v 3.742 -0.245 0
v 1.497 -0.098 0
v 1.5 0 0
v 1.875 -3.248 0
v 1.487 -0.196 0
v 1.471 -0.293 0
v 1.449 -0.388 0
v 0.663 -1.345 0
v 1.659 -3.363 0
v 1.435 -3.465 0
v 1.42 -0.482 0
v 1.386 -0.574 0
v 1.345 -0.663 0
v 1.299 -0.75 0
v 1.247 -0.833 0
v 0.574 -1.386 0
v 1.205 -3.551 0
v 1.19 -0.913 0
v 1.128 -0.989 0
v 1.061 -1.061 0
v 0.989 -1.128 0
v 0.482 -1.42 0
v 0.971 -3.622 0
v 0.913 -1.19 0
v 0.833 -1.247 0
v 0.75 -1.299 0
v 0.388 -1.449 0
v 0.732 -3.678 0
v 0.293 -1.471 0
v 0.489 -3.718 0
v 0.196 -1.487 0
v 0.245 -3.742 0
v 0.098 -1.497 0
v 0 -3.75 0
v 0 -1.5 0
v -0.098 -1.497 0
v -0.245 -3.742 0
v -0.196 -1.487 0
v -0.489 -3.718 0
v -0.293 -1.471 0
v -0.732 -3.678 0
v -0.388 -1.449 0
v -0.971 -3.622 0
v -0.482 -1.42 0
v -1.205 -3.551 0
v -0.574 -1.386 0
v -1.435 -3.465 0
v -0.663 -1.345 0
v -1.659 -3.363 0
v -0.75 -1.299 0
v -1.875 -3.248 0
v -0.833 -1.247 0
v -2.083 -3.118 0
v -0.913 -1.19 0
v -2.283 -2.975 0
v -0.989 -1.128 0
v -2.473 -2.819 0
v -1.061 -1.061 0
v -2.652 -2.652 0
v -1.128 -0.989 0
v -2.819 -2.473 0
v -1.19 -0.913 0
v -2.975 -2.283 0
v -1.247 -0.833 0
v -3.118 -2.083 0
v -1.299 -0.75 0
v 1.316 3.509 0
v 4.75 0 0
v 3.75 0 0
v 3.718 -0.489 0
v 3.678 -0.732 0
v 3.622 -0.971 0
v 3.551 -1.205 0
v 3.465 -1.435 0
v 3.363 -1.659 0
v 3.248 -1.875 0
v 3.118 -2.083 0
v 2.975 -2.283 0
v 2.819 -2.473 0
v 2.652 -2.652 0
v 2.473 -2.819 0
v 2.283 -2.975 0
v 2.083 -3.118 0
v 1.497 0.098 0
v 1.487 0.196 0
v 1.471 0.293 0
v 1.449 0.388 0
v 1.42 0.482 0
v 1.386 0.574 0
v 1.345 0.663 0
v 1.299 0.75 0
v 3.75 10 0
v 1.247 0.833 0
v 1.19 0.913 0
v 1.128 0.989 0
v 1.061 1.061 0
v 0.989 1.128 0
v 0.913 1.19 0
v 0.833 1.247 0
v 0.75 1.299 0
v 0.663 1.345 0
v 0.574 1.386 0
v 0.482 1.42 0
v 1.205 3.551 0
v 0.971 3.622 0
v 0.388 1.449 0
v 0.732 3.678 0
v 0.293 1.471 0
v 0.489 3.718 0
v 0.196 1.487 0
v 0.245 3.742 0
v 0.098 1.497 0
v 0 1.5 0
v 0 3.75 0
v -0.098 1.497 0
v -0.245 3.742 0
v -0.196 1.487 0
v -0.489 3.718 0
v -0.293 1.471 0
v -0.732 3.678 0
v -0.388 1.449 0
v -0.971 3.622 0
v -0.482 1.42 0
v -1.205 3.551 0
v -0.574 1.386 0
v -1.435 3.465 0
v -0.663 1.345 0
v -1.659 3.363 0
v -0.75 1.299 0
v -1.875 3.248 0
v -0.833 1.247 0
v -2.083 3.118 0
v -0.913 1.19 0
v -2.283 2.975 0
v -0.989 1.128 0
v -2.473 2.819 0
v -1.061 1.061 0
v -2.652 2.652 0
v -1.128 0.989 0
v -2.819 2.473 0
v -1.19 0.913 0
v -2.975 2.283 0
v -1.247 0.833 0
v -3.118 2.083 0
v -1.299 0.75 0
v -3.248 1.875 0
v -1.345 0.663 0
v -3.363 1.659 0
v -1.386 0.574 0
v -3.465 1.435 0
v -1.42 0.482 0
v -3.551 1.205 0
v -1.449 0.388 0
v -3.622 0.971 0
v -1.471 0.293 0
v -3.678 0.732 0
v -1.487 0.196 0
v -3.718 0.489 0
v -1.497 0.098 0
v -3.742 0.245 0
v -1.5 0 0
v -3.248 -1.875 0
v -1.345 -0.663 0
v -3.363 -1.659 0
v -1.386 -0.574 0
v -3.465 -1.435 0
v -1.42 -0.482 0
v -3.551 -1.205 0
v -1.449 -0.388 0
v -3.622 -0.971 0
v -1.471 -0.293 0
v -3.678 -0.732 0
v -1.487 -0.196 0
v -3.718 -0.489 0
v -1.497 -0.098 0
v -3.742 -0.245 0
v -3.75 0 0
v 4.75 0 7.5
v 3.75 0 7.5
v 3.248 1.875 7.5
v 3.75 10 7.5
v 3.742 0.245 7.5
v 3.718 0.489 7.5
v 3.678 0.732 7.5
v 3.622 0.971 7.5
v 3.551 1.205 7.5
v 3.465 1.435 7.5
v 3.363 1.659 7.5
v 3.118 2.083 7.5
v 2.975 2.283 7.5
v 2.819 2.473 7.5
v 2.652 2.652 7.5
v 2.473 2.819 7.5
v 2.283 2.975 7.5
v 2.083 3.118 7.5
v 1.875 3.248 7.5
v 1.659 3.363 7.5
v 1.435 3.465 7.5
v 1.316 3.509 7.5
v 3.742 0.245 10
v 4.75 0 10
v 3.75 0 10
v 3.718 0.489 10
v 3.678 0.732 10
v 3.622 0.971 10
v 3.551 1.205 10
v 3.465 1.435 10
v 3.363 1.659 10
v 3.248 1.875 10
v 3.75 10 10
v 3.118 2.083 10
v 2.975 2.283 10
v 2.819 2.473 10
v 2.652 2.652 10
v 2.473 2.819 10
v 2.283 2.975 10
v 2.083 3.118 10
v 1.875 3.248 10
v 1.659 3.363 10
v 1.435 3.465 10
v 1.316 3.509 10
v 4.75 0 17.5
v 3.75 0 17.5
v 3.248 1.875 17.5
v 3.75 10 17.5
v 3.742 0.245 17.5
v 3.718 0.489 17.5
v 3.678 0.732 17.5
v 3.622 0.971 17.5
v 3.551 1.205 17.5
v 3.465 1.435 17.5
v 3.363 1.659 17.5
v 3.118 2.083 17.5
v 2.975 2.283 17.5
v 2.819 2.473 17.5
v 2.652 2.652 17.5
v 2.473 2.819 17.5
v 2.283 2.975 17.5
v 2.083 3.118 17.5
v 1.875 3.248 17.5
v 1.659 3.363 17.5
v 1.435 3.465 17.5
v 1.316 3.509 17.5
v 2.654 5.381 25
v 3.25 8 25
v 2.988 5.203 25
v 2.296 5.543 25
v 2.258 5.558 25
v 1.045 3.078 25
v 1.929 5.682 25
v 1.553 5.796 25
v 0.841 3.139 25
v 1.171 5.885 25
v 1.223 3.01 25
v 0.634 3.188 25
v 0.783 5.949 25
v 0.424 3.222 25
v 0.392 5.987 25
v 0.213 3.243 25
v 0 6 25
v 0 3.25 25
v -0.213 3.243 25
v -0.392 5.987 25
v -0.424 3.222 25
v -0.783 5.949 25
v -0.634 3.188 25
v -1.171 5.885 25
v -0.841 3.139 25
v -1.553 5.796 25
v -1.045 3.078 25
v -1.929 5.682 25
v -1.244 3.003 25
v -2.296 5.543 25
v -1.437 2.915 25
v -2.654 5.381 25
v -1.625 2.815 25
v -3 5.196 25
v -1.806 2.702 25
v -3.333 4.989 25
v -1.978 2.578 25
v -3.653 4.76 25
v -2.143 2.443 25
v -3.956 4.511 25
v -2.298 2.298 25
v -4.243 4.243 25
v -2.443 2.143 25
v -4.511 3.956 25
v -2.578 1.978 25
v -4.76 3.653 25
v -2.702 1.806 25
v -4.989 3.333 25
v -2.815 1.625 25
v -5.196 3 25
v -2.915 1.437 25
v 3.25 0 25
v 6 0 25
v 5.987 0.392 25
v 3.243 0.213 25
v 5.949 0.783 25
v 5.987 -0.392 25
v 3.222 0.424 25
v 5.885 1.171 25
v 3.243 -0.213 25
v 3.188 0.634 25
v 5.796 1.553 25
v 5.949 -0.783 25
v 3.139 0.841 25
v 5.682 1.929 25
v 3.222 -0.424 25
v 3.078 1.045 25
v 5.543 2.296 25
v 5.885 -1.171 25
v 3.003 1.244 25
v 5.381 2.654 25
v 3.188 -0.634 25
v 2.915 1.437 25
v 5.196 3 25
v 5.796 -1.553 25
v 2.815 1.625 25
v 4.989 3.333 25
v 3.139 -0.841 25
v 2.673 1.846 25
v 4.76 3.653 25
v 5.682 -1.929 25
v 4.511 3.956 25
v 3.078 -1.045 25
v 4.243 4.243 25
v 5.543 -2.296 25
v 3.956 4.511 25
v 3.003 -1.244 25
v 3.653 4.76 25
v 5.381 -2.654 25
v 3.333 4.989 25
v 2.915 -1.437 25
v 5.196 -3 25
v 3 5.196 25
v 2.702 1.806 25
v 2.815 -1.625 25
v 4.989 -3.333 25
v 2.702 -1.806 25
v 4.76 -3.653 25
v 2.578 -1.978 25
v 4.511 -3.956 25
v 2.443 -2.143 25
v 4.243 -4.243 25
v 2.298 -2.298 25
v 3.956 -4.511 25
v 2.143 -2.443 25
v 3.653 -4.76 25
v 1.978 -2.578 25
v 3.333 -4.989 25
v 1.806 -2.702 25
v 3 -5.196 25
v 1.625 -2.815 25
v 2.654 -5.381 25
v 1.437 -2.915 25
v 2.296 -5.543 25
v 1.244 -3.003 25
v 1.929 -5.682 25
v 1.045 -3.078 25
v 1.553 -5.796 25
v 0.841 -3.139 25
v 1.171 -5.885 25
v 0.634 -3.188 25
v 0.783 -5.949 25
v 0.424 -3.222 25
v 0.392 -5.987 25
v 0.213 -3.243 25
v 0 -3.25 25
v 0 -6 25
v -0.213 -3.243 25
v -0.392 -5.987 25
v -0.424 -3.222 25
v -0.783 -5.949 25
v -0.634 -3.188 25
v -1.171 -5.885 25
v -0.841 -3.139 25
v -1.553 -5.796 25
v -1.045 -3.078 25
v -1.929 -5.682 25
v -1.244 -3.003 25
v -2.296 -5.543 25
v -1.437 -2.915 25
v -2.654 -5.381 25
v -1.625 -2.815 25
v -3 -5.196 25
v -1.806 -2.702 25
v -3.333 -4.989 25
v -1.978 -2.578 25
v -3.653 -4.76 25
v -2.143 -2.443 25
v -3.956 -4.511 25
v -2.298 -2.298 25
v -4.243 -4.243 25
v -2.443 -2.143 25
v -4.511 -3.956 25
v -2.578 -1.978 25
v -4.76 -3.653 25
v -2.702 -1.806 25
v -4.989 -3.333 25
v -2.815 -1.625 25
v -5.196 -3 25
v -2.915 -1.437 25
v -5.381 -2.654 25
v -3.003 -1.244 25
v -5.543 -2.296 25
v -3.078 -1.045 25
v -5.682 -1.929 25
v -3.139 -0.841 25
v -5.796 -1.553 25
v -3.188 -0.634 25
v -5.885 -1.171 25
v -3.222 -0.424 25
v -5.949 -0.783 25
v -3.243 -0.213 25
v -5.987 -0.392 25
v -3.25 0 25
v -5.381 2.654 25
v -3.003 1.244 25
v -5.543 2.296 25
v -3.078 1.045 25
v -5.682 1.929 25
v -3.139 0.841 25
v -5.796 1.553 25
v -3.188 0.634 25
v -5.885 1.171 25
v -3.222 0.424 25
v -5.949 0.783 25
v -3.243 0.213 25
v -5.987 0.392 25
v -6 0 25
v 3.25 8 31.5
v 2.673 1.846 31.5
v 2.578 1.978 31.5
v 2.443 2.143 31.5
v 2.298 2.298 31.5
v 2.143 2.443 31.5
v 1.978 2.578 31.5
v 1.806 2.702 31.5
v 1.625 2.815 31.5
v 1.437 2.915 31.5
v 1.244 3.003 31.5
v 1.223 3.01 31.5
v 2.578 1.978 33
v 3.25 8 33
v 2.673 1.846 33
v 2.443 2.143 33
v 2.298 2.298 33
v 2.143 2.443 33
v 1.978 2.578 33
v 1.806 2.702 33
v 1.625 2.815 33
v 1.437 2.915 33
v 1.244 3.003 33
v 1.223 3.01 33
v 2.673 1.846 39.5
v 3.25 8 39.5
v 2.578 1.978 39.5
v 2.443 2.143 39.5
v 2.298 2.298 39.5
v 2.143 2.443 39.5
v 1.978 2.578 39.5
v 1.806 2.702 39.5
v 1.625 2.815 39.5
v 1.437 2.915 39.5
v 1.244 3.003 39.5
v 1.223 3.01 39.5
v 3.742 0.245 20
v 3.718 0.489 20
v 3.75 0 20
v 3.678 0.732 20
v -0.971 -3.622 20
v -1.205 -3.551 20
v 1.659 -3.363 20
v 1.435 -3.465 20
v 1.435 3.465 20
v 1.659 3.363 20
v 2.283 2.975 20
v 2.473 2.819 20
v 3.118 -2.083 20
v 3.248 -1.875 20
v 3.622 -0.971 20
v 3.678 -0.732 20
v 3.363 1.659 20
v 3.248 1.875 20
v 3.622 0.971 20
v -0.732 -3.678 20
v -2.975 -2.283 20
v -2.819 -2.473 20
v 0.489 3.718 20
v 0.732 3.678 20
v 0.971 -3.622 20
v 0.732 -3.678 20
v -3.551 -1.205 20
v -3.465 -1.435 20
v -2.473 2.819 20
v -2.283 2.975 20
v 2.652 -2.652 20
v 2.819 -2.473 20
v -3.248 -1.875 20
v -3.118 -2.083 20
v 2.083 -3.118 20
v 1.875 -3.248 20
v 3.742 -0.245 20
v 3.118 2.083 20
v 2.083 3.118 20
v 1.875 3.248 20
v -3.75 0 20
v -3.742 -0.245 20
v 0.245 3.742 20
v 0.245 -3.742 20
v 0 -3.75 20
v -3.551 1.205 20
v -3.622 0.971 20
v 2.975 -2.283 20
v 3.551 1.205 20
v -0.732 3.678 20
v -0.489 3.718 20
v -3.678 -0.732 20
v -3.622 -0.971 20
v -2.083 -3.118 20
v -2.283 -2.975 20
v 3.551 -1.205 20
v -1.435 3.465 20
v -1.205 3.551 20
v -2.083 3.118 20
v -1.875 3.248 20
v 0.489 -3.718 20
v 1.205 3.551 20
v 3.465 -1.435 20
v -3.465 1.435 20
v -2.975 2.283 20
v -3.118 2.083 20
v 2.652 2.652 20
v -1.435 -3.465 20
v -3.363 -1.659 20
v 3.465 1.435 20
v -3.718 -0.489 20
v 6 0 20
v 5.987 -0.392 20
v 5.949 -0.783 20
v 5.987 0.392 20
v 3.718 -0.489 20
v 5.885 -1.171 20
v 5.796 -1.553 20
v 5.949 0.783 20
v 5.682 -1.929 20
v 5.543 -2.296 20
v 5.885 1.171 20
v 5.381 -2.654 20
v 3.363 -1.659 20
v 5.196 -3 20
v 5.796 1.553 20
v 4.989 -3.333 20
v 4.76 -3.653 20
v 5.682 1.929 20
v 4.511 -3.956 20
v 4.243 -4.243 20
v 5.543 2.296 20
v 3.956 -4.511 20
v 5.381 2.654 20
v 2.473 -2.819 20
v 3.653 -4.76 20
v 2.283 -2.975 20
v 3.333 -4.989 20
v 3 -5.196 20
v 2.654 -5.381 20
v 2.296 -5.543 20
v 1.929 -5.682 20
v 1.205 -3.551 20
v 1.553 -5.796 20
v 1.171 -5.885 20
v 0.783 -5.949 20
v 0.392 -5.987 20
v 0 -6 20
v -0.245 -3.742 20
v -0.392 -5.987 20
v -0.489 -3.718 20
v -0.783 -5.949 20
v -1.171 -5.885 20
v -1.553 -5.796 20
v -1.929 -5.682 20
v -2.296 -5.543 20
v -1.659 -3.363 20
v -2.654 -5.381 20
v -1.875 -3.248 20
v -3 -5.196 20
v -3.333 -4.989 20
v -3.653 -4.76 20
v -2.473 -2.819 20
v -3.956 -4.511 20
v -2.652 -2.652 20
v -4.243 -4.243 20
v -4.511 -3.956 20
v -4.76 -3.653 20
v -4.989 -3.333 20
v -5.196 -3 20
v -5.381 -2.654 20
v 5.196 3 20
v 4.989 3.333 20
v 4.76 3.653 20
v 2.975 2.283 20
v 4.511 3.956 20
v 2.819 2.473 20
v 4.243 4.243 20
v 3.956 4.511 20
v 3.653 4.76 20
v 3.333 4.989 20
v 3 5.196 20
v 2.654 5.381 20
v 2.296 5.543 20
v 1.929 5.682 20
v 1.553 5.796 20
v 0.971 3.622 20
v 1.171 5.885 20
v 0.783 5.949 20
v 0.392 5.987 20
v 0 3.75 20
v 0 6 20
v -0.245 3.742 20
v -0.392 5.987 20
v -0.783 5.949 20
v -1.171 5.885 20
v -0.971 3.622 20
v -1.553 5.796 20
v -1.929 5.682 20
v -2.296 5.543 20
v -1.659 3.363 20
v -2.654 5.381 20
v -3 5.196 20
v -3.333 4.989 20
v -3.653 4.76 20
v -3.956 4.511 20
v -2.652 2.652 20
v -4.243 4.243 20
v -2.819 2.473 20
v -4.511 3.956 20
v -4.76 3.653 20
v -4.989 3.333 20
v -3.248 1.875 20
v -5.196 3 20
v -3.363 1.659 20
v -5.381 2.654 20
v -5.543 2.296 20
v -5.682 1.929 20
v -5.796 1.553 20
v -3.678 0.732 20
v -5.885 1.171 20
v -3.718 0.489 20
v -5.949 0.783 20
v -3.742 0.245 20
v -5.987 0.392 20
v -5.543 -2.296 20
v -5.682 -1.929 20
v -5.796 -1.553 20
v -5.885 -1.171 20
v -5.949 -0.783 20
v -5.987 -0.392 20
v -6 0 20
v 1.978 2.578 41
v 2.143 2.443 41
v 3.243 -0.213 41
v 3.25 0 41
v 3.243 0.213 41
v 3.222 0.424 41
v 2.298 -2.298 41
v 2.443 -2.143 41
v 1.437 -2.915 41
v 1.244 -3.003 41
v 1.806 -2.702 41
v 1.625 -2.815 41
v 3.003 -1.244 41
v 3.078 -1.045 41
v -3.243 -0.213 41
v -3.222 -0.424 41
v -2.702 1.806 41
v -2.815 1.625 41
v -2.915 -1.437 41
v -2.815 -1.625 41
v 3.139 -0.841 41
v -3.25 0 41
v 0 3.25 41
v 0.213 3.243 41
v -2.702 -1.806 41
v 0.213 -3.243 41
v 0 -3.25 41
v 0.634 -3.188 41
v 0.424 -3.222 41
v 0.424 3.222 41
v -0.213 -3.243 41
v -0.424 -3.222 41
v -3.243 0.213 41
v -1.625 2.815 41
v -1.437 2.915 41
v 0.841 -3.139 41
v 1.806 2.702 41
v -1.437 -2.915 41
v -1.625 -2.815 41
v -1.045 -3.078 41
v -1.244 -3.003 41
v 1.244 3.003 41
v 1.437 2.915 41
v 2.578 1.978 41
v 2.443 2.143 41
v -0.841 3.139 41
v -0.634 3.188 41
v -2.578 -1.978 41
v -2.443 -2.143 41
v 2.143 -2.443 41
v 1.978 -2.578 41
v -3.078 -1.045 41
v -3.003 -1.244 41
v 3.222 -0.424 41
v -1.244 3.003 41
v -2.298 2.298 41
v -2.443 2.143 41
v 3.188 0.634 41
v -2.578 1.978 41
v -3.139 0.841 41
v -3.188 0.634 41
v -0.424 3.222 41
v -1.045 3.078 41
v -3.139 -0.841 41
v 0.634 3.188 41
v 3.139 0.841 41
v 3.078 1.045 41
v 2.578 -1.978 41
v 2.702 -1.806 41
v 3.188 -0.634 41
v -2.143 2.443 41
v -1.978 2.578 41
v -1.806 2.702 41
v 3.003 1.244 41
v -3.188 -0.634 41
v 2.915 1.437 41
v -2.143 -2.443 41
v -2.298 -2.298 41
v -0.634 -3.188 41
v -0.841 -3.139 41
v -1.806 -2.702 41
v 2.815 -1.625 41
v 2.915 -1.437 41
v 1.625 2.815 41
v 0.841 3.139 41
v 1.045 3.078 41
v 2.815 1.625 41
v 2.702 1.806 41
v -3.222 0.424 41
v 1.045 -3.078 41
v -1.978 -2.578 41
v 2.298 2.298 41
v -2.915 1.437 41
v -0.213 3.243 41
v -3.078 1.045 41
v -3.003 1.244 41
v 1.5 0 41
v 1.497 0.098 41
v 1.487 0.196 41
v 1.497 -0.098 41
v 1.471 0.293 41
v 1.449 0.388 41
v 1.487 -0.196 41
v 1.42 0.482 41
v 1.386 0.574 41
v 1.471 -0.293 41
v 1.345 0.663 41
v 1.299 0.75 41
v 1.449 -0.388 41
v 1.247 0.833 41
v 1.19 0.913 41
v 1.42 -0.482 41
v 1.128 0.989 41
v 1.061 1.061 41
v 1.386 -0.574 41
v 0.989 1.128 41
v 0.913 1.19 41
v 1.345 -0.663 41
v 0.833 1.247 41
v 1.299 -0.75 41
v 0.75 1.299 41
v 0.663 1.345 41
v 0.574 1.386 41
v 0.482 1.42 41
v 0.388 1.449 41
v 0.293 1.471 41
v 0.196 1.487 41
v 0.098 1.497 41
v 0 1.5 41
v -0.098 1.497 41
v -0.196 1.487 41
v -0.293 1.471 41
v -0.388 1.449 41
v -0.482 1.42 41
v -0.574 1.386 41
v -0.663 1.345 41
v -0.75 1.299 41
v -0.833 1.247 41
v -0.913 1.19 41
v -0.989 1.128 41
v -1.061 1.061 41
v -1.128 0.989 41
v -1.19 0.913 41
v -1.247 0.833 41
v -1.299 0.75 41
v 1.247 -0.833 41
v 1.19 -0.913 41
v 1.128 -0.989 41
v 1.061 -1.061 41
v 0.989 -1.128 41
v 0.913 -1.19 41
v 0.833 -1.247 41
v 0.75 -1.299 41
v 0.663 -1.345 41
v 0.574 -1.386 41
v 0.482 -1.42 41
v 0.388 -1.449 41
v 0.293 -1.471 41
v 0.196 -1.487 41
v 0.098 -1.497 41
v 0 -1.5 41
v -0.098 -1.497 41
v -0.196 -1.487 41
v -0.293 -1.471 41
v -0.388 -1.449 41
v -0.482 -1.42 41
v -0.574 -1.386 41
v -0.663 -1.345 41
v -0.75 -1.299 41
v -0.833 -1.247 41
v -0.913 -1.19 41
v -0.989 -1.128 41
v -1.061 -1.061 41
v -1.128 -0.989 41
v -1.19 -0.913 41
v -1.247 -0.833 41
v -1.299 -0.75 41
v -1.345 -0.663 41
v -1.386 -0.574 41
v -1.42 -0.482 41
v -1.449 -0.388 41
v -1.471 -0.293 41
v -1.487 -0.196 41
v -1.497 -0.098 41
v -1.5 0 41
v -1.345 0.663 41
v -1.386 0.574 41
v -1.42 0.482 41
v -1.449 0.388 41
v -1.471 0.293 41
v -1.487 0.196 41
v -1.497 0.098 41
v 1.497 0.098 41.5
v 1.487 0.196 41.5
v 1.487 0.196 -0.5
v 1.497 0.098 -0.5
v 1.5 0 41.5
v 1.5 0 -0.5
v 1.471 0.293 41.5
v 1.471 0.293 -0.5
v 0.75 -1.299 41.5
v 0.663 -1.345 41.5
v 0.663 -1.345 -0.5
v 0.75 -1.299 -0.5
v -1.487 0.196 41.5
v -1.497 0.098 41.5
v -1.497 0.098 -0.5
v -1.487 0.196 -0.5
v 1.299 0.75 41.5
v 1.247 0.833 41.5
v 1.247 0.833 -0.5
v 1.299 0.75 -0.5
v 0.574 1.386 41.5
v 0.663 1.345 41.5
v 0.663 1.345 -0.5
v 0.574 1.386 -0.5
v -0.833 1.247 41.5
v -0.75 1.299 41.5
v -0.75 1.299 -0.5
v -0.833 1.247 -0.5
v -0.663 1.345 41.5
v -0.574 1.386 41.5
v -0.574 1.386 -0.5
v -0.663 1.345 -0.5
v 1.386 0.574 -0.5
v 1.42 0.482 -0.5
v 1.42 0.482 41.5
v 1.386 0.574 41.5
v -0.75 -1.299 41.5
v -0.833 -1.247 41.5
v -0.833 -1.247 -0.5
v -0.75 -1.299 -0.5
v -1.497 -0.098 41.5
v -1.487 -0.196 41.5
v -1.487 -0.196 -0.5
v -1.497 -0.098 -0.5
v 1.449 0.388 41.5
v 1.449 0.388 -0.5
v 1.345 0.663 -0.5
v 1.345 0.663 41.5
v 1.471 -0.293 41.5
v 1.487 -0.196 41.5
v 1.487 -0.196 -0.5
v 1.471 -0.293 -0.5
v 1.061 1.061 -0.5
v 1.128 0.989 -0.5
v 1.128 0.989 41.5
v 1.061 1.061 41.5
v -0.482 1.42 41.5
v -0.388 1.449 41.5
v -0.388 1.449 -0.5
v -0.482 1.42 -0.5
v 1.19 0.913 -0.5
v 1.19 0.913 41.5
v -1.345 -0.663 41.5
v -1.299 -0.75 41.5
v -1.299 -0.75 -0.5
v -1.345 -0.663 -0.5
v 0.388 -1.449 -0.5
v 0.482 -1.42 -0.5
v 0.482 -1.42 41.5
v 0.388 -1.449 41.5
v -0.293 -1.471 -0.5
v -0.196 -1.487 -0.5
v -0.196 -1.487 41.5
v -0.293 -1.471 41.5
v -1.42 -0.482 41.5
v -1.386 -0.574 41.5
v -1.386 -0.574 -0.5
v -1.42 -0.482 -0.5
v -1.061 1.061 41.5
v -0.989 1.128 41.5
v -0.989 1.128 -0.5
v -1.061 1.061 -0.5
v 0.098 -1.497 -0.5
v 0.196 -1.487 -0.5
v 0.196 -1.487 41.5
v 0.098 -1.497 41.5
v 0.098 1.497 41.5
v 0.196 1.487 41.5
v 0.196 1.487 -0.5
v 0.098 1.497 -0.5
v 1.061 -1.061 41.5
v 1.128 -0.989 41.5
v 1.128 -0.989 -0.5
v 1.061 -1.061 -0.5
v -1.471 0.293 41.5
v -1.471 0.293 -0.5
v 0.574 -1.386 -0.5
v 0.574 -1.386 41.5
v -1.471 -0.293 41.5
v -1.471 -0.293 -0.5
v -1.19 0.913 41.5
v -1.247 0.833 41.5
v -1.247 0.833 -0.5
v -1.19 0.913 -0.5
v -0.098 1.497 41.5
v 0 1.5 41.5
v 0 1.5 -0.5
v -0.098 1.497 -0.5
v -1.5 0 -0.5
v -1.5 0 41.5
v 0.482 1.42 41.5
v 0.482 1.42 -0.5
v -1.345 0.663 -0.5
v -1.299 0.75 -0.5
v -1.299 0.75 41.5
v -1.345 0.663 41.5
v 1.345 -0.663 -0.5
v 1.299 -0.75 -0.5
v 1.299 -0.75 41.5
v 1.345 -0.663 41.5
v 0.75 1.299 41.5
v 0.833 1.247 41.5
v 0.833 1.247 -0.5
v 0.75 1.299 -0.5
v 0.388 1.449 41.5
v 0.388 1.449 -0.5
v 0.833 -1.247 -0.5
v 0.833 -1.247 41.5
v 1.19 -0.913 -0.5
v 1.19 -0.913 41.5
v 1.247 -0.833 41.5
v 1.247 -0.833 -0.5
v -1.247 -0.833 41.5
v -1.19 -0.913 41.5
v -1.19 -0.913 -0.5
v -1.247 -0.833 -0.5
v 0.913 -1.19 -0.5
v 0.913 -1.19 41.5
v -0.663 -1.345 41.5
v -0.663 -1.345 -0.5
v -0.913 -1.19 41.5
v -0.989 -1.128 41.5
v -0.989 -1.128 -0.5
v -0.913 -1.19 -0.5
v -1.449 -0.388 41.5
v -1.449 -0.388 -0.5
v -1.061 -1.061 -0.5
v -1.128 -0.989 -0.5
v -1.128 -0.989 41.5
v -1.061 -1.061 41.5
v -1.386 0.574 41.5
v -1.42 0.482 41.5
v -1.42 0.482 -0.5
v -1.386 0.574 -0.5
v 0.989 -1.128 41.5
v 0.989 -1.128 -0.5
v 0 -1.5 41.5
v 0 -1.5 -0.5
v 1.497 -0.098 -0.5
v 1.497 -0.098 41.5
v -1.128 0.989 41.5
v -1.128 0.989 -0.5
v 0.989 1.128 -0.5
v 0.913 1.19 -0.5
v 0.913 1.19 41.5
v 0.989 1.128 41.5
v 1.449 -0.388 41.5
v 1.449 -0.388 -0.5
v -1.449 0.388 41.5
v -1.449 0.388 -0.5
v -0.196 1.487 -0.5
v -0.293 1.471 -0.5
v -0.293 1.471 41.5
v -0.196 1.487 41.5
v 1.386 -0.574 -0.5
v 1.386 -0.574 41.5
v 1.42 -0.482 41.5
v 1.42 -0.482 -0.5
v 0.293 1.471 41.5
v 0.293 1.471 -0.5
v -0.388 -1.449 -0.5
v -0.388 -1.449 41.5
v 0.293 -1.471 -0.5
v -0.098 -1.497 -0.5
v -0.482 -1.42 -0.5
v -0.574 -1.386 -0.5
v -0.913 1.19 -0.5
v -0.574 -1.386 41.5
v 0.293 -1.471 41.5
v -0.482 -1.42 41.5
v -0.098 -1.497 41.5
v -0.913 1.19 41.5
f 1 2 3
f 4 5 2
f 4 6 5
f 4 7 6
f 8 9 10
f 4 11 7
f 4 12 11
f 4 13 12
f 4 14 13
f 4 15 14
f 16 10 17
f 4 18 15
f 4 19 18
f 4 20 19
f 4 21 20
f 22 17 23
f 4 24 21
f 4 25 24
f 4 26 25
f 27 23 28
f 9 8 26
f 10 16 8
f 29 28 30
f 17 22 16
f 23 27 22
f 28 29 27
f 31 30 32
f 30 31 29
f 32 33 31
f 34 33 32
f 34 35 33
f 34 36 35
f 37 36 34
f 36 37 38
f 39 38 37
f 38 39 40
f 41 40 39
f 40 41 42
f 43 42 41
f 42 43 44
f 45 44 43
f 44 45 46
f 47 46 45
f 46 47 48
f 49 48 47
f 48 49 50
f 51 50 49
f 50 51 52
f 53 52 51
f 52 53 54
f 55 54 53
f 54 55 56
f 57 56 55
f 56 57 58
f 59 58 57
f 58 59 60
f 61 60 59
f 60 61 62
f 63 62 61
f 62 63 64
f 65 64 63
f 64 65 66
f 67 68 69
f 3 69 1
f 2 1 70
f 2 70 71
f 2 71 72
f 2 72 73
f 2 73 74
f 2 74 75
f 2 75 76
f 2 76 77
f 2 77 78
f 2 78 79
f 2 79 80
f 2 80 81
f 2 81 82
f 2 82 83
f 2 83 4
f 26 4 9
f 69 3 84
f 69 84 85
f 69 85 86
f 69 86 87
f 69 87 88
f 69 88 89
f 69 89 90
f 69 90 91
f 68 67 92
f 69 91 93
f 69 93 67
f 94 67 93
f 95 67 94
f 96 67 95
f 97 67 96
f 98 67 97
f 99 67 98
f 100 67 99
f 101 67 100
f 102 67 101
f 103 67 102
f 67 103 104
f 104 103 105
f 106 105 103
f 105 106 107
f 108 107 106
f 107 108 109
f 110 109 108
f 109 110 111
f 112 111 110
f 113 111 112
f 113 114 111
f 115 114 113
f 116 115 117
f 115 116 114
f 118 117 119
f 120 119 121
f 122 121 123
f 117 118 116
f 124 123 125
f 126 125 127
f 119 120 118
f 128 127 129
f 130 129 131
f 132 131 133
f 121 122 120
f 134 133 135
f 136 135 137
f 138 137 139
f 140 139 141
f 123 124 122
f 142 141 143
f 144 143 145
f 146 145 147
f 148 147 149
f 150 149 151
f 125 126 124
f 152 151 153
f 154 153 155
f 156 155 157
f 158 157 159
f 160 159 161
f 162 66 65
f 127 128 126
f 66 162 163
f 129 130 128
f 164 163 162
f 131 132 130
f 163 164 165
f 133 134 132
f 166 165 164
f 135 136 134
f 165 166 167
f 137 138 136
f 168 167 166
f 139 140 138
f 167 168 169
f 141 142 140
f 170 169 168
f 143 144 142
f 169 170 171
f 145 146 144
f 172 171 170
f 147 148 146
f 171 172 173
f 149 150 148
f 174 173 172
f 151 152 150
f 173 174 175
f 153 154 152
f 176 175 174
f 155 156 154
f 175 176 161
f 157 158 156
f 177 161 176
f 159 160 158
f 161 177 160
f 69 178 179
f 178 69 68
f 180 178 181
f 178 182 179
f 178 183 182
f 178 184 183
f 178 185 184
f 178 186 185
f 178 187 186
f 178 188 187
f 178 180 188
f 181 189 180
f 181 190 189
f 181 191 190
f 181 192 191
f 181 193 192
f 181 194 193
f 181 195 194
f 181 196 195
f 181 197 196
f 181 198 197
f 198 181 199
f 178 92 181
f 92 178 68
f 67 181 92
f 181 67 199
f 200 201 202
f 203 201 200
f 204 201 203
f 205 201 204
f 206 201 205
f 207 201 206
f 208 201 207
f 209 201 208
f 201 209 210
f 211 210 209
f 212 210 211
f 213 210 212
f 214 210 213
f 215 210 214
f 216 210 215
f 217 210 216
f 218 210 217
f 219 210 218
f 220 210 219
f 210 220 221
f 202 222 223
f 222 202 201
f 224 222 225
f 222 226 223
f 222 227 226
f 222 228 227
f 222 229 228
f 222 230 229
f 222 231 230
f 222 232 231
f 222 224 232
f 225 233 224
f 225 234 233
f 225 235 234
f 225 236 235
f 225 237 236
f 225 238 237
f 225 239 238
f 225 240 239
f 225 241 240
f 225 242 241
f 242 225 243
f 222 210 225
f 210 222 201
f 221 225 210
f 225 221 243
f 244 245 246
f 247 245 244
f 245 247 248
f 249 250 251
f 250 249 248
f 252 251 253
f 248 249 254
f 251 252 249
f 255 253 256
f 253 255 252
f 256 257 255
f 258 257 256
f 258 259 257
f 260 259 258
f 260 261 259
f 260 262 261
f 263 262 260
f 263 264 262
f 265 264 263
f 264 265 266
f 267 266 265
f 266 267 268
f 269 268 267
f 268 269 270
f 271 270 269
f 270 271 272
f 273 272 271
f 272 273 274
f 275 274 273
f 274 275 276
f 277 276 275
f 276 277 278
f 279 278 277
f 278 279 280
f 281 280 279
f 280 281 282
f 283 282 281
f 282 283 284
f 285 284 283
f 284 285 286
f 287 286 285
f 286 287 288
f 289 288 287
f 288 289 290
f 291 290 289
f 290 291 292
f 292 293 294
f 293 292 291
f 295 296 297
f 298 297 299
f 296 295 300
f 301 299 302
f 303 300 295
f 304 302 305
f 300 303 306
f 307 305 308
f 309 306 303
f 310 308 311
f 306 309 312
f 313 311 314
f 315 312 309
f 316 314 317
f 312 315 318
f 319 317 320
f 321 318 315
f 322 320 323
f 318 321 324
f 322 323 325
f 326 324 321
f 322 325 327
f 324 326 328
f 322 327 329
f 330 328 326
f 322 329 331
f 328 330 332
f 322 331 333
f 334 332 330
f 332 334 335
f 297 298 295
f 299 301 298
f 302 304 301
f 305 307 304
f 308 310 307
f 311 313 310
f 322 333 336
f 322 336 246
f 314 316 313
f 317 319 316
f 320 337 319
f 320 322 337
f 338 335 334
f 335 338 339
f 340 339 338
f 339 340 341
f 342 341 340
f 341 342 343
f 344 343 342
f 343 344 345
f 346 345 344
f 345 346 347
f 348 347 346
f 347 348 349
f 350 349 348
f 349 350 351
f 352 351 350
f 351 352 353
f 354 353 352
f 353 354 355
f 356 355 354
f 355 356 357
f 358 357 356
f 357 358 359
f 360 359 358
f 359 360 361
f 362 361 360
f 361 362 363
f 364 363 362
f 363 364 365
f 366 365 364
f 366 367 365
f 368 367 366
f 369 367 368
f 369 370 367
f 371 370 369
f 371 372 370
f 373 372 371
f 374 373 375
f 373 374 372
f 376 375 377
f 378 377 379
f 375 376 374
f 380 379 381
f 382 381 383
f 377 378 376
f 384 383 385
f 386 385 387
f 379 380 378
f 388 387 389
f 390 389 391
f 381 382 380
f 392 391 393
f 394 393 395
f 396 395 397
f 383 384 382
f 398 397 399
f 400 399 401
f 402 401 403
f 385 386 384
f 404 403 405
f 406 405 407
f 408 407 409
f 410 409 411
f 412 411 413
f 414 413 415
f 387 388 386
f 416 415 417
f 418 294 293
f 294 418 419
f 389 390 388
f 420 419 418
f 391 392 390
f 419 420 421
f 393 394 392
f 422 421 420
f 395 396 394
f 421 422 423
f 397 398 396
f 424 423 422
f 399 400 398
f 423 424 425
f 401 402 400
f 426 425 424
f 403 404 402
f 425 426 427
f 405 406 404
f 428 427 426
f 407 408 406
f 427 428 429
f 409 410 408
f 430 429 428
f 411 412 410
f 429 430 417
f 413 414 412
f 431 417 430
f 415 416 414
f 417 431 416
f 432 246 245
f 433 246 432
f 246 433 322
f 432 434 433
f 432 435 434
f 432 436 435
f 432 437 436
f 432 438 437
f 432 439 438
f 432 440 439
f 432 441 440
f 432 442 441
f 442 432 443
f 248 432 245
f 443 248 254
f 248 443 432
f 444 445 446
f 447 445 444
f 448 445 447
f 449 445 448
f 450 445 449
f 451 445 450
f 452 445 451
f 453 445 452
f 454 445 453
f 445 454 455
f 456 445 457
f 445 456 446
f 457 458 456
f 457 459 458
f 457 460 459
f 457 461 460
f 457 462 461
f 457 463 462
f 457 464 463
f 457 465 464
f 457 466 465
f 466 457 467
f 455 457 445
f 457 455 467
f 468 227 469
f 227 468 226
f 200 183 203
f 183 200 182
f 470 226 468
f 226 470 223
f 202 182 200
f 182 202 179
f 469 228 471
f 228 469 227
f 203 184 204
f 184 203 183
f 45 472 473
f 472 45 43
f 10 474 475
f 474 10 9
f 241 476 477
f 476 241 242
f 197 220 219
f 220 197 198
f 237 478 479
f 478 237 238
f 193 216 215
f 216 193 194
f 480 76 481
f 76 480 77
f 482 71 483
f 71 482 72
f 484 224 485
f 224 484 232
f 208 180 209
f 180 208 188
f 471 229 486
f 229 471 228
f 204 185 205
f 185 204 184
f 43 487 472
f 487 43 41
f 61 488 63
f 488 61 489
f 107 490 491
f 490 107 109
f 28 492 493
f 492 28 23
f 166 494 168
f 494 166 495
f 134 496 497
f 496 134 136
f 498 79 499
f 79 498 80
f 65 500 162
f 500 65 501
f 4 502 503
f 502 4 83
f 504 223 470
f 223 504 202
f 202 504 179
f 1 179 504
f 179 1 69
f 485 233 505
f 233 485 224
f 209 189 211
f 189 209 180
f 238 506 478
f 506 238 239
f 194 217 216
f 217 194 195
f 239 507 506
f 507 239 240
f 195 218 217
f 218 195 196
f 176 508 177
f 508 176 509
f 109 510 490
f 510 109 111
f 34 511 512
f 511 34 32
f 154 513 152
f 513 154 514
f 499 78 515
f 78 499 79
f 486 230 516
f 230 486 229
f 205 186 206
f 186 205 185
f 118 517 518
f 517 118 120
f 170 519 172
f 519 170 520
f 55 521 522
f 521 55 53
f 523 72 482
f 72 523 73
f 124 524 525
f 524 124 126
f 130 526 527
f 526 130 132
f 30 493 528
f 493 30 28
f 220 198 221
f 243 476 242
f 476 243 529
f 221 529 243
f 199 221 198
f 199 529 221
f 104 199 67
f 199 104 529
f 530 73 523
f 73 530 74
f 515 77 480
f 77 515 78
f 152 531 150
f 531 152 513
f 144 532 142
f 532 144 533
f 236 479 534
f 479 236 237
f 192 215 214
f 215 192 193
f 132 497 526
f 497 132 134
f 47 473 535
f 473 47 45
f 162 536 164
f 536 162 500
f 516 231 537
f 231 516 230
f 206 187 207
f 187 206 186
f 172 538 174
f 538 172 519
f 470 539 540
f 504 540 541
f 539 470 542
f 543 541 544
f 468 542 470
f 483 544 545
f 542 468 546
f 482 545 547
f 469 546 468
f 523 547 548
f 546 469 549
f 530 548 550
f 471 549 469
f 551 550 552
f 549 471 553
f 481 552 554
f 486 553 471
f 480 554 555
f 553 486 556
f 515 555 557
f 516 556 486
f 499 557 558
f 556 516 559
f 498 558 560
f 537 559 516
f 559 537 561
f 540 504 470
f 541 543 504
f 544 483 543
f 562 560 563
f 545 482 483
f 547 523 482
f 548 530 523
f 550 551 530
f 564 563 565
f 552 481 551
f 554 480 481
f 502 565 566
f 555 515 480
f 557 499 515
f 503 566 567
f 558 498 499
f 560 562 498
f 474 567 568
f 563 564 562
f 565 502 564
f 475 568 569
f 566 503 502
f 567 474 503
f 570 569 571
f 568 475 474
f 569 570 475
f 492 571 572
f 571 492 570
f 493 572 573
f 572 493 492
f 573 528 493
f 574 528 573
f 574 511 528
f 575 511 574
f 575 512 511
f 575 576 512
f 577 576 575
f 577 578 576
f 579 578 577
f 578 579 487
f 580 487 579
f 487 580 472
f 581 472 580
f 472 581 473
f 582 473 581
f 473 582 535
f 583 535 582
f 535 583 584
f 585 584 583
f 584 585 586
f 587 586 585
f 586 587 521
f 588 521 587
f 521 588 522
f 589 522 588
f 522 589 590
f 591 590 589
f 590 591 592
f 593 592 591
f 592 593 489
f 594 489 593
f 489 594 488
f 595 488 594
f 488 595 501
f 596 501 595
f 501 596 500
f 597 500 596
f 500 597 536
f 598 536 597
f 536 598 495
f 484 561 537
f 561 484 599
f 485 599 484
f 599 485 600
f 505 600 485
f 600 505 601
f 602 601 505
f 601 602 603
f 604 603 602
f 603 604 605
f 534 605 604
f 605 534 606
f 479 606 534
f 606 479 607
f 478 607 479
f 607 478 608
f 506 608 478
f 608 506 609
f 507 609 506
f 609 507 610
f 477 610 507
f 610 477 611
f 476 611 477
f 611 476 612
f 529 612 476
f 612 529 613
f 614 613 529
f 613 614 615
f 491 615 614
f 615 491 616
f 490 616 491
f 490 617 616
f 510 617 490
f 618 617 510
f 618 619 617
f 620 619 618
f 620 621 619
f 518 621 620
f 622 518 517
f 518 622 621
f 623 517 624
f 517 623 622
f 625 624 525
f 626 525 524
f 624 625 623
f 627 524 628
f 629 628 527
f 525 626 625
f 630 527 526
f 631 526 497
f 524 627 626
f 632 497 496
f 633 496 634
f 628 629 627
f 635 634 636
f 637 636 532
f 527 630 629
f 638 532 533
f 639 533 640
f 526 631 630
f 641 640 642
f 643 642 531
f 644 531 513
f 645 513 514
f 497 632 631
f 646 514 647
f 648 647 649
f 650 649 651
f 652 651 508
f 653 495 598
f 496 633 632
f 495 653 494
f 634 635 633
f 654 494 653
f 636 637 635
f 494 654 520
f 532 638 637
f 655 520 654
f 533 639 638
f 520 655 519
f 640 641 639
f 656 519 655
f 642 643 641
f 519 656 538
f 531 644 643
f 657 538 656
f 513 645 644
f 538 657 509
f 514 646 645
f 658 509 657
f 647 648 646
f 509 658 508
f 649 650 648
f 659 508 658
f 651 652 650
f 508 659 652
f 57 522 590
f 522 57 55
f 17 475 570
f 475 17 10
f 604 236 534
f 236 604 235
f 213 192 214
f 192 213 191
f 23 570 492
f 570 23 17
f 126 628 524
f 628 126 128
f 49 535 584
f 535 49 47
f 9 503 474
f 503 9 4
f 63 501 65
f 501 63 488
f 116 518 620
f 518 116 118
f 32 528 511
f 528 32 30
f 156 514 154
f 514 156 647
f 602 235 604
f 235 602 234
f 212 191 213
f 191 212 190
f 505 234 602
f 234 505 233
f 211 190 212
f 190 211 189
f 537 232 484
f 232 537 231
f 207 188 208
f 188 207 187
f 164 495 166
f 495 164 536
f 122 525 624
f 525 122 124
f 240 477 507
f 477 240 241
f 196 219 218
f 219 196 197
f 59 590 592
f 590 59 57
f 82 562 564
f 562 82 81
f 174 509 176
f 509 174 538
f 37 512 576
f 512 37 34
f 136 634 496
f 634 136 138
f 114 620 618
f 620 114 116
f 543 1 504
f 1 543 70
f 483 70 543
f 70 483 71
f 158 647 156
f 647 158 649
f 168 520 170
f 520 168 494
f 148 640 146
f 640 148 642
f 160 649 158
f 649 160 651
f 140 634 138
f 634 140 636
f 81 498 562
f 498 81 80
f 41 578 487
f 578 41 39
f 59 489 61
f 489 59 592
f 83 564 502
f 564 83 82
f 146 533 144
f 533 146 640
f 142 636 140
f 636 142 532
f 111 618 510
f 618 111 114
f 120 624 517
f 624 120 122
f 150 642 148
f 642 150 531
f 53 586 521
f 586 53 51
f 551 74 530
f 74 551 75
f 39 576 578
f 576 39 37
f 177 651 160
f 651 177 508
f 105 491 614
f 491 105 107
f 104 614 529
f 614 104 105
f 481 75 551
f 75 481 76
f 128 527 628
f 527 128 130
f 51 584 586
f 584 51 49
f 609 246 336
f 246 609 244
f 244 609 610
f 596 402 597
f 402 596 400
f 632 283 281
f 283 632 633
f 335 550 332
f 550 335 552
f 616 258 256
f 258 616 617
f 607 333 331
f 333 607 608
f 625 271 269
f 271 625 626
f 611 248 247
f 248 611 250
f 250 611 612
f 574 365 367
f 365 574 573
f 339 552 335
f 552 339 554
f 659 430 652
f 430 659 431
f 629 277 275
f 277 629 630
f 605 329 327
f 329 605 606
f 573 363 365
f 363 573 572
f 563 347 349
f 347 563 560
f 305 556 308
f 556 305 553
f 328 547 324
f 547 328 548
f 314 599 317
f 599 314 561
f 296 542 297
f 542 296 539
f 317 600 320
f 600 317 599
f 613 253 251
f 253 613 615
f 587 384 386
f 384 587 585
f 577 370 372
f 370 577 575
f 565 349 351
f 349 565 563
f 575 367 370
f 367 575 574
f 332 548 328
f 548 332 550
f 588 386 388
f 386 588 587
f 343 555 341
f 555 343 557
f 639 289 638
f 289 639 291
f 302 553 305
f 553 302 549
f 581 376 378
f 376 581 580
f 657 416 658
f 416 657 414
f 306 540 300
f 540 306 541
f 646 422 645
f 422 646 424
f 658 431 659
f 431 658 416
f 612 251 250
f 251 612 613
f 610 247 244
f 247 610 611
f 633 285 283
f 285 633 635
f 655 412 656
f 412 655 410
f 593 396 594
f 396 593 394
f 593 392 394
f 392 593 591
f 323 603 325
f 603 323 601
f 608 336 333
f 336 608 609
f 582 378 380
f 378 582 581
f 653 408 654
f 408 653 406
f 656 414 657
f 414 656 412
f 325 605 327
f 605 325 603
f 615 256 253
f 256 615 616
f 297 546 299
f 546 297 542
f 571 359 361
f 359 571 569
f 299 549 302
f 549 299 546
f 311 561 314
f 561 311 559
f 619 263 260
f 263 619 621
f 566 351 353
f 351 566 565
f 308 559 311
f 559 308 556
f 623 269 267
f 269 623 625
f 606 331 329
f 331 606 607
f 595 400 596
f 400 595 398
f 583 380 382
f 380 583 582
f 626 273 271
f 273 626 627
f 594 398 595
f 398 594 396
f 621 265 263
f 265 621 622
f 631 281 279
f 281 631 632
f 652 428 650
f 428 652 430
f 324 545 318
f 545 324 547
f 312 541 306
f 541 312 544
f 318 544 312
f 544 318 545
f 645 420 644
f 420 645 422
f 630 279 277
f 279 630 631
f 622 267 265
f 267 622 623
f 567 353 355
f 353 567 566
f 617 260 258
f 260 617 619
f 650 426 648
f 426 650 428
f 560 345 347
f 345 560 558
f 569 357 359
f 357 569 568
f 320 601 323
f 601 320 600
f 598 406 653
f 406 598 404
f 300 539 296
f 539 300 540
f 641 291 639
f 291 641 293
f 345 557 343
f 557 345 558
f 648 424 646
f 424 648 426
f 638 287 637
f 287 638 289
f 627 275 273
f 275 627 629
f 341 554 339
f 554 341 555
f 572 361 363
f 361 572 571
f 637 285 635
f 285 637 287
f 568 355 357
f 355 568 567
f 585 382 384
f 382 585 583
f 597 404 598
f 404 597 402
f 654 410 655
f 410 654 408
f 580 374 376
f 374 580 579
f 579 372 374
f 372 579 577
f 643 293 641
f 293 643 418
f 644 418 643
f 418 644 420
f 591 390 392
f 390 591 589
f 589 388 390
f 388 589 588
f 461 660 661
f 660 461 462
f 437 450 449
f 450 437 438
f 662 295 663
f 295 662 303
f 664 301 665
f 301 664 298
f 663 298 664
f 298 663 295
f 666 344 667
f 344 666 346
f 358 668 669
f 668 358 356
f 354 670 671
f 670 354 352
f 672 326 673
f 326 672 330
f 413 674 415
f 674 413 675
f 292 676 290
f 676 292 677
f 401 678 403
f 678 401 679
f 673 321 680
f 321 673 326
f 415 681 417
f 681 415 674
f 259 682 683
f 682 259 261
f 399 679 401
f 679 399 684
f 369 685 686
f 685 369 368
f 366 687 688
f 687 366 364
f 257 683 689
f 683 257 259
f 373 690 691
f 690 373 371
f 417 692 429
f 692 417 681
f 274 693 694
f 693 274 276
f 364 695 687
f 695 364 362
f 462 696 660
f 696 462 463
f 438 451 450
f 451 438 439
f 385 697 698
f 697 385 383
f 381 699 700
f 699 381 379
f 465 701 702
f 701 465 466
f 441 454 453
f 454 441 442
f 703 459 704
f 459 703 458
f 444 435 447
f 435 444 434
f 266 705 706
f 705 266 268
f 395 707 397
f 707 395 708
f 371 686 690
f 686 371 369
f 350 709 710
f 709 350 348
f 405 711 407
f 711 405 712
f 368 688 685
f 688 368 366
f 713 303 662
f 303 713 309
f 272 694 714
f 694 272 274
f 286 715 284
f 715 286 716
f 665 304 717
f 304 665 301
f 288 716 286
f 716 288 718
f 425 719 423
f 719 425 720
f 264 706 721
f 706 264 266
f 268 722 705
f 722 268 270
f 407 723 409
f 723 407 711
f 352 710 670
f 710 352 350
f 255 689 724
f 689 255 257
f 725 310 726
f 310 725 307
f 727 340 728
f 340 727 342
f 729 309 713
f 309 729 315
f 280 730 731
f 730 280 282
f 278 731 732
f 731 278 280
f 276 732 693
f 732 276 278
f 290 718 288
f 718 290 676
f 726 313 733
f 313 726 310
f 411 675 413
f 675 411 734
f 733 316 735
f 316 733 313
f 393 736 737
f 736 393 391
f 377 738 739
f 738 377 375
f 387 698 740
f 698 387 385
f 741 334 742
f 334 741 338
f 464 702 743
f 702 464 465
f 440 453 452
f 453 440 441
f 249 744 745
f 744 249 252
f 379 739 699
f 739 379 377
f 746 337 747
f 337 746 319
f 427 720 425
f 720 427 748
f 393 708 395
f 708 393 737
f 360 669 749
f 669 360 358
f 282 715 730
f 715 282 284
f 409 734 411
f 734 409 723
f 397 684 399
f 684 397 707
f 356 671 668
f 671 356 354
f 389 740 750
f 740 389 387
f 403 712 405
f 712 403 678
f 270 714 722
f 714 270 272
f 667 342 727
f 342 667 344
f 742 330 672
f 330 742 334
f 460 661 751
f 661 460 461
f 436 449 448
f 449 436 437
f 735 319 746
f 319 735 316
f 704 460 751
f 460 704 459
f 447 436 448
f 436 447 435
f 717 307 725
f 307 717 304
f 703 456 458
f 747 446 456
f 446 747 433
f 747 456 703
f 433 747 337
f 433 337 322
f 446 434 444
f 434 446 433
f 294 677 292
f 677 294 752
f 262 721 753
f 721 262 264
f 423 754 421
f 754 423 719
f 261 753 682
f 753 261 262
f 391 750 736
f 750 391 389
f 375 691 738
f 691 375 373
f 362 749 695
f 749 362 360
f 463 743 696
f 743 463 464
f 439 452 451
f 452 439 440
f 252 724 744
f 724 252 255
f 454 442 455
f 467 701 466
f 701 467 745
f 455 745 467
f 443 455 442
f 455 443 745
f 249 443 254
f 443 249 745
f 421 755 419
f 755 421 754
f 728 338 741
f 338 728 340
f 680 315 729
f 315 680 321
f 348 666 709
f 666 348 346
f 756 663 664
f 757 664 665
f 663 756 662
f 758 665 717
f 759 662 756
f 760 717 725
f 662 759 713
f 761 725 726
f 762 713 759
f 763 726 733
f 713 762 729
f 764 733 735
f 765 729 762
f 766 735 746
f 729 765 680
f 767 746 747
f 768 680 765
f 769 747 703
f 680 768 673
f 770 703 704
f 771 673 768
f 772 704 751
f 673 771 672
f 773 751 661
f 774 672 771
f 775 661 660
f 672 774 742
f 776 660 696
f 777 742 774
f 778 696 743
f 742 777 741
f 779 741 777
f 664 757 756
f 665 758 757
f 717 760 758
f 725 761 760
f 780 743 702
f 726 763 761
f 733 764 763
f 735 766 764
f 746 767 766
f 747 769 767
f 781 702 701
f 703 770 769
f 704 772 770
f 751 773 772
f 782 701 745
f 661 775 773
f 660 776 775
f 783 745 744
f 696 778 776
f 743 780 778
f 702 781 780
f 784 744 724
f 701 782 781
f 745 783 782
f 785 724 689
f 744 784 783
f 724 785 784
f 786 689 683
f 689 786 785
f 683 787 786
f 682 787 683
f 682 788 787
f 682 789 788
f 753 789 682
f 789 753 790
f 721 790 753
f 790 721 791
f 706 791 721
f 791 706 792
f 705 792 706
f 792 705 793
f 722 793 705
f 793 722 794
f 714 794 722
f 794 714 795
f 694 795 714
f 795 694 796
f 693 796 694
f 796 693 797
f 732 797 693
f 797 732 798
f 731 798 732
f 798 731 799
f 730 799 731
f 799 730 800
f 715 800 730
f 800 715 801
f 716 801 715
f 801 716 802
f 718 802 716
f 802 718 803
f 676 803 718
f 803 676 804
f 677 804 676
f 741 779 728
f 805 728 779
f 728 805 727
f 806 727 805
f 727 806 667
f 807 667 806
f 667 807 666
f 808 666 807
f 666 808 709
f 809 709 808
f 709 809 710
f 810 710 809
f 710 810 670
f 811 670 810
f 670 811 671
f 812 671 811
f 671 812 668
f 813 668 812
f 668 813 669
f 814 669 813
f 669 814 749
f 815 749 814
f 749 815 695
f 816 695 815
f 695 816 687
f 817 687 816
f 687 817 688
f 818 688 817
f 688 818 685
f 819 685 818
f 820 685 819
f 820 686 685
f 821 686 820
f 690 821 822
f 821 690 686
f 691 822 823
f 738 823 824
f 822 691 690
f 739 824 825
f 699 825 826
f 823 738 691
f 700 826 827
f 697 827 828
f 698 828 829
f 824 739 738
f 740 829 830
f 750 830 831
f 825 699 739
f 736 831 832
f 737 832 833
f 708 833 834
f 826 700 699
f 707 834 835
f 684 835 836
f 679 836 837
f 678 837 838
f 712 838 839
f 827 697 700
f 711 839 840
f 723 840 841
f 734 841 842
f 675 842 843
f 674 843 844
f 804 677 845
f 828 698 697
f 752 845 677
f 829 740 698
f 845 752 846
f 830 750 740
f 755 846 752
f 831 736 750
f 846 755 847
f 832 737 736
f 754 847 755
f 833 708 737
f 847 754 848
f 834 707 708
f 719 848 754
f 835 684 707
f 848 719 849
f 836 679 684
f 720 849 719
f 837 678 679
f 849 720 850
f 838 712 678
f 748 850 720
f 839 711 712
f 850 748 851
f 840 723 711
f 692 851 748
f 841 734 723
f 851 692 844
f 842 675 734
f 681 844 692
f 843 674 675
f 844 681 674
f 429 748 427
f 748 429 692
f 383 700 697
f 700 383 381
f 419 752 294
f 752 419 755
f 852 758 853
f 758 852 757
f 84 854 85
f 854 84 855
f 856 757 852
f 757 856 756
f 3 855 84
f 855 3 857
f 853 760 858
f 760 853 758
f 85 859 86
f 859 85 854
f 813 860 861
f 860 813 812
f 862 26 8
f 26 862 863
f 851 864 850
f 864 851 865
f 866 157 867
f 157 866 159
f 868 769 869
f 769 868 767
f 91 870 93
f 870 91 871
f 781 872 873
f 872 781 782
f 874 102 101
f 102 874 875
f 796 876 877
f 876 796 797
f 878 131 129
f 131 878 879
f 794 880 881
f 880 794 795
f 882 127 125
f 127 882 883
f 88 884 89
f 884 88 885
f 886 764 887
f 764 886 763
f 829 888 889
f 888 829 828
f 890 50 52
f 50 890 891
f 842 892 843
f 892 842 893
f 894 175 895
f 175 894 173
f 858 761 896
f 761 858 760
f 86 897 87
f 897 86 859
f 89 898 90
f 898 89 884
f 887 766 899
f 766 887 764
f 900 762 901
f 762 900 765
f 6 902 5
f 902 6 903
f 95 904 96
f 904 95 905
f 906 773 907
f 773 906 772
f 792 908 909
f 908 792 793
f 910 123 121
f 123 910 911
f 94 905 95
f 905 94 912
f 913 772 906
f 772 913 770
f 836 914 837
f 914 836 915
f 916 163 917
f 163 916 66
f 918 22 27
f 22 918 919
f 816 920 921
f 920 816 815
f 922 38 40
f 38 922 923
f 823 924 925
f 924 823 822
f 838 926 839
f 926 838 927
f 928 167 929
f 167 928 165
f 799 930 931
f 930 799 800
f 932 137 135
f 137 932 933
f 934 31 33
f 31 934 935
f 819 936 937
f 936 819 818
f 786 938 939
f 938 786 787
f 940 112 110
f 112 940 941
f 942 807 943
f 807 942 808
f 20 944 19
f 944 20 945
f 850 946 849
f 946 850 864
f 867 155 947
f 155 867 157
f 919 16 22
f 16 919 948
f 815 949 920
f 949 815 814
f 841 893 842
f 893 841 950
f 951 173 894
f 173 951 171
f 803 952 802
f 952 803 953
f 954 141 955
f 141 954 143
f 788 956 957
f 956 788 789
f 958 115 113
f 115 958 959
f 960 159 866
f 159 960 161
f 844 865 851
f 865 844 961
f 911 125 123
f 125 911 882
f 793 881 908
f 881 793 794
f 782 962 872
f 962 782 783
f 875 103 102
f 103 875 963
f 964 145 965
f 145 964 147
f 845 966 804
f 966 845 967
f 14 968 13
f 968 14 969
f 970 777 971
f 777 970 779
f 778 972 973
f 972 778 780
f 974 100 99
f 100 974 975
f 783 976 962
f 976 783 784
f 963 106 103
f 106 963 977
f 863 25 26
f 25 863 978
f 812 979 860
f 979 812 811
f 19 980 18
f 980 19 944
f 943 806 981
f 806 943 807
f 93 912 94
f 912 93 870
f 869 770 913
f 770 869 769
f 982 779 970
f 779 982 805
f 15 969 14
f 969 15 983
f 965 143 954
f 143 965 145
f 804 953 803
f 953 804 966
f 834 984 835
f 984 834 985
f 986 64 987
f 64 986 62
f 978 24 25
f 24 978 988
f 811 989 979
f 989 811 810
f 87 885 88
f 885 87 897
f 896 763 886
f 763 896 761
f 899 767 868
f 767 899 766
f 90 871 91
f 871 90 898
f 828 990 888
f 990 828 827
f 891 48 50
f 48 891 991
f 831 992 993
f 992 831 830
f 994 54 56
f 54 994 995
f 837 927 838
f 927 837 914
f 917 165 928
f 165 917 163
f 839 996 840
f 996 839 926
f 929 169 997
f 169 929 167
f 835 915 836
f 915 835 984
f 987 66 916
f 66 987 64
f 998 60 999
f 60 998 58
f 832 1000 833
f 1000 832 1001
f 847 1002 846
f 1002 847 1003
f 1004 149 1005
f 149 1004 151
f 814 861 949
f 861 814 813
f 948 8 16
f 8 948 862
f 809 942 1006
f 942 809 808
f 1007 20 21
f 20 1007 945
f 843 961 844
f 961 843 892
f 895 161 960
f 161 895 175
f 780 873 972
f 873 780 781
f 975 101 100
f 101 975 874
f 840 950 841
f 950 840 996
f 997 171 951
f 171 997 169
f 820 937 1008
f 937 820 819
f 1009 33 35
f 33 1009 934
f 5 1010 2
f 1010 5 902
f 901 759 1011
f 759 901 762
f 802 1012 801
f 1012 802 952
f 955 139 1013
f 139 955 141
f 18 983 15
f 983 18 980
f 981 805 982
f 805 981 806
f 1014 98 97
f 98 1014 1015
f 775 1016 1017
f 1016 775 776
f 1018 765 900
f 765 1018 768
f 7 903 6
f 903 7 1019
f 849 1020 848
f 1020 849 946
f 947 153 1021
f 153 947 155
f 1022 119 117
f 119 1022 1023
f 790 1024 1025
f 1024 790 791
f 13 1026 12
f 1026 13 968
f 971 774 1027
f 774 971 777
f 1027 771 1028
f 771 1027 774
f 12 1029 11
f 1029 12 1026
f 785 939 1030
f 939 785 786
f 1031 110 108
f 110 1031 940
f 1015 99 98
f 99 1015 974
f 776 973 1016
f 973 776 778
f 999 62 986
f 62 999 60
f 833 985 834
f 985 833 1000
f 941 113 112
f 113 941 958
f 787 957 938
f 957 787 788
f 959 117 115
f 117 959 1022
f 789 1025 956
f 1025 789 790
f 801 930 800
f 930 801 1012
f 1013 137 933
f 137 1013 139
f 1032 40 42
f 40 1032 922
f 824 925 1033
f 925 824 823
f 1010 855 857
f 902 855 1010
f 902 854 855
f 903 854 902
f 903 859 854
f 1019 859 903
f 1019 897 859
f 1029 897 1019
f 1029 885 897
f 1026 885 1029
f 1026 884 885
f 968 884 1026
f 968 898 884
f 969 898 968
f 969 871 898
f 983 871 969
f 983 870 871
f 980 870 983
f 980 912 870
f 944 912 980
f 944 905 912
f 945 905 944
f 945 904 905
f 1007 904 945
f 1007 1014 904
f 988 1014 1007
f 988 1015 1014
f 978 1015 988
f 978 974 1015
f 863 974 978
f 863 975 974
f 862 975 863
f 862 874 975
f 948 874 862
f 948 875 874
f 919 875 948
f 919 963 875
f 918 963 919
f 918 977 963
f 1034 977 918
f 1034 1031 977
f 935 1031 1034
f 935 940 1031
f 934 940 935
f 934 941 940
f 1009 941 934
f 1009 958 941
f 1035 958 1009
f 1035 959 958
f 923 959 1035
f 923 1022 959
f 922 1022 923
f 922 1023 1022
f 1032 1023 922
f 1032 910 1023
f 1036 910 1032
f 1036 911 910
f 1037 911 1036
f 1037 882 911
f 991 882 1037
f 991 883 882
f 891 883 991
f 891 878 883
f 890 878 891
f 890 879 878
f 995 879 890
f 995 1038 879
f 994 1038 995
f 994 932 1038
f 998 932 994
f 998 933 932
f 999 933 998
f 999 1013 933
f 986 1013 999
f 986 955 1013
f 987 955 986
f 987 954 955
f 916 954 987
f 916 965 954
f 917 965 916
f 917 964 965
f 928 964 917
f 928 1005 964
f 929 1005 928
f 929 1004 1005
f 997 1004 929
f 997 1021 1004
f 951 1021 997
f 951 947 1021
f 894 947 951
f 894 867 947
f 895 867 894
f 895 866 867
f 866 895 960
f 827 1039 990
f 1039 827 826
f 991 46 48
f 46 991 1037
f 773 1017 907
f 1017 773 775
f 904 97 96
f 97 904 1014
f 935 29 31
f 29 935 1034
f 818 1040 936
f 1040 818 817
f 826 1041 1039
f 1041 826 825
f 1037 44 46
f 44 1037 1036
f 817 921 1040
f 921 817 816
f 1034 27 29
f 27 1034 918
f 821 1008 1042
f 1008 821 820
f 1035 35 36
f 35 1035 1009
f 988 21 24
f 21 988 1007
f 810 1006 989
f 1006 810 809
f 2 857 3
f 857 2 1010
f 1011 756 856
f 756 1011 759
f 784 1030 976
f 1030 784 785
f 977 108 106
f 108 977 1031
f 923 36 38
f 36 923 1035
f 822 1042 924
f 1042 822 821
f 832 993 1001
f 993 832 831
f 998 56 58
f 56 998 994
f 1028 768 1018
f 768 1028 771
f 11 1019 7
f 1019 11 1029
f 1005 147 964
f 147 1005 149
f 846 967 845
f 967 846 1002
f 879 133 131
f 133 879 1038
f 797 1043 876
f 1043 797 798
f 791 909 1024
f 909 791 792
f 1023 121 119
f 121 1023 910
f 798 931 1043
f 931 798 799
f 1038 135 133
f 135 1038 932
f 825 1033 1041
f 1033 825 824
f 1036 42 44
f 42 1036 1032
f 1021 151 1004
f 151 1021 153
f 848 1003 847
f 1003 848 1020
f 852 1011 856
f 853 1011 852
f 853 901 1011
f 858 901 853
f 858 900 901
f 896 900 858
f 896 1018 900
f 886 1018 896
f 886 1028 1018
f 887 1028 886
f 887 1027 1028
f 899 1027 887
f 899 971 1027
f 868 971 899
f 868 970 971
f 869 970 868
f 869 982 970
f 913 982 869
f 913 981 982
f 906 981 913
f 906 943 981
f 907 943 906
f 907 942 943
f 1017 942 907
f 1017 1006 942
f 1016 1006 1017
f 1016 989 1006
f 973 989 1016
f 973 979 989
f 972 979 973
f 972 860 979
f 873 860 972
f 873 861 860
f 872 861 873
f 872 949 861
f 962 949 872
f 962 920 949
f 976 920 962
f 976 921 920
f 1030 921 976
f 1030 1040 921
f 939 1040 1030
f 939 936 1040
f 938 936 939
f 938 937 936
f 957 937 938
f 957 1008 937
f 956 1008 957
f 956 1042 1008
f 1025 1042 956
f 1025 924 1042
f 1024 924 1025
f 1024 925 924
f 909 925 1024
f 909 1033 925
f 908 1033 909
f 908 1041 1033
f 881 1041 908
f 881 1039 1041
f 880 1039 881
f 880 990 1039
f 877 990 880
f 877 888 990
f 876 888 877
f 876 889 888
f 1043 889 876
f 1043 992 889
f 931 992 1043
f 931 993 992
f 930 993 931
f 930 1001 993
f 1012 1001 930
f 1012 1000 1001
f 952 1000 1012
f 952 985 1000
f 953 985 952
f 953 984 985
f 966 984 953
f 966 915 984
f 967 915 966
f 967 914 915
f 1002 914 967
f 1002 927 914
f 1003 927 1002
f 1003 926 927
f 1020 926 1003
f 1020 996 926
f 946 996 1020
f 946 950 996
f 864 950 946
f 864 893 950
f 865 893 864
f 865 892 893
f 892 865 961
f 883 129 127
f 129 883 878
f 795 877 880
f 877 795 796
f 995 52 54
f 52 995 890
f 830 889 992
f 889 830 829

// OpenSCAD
// Hose-barb reducer: joins 8 mm ID tubing to 5 mm ID tubing
// Print orientation: standing upright along Z, centred on origin in X/Y

$fn = 96;

// ---- Dimensions (mm) ----
eps      = 0.5;     // cutter overshoot past faces
barb8_h  = 10;      // height of each 8 mm tubing barb
barb8_od_bottom = 7.5; // outer diameter of 8 mm barb at bottom
barb8_od_top   = 9.5;  // outer diameter of 8 mm barb at top
barb8_d  = 7.5;      // outer diameter of 8 mm barb after step back
collar_d  = 12;      // diameter of cylindrical collar
barb5_h  = 8;       // height of each 5 mm tubing barb
barb5_od_bottom = 6.5; // outer diameter of 5 mm barb at bottom
barb5_od_top   = 5.0;  // outer diameter of 5 mm barb at top
barb5_d  = 6.5;      // outer diameter of 5 mm barb after step back
bore_d   = 3;       // through-bore diameter
z0      = 0;        // start of first 8 mm barbs
z20     = 20;       // end of first 8 mm barbs / start of collar
z25     = 25;       // end of collar / start of 5 mm barbs
z41     = 41;       // end of 5 mm barbs

// ---- Model ----
union() {
    // First set of barbs for 8 mm tubing (z = 0 to 20)
    for (i = [0 : 1]) {
        translate([0, 0, z0 + i * barb8_h])
            linear_extrude(height = barb8_d)
                polygon([
                    [0, 0],
                    [barb8_od_bottom / 2, barb8_h],
                    [barb8_od_top / 2, 0]
                ]);
    }
    // Step back to 7.5 mm diameter
    translate([0, 0, z0])
        cylinder(d = barb8_d, h = barb8_h * 2);

    // Cylindrical collar (z = 20 to 25)
    translate([0, 0, z20])
        cylinder(d = collar_d, h = z25 - z20);

    // Second set of barbs for 5 mm tubing (z = 25 to 41)
    for (i = [0 : 1]) {
        translate([0, 0, z25 + i * barb5_h])
            linear_extrude(height = barb5_d)
                polygon([
                    [0, 0],
                    [barb5_od_bottom / 2, barb5_h],
                    [barb5_od_top / 2, 0]
                ]);
    }
    // Step back out to 6.5 mm diameter
    translate([0, 0, z25])
        cylinder(d = barb5_d, h = barb5_h * 2);
}

// ---- Full bore through the part ----
difference() {
    // (current part)
    // Through-bore cutter, extended past all faces
    translate([0, 0, -eps])
        cylinder(d = bore_d, h = z41 + 2 * eps);
}
